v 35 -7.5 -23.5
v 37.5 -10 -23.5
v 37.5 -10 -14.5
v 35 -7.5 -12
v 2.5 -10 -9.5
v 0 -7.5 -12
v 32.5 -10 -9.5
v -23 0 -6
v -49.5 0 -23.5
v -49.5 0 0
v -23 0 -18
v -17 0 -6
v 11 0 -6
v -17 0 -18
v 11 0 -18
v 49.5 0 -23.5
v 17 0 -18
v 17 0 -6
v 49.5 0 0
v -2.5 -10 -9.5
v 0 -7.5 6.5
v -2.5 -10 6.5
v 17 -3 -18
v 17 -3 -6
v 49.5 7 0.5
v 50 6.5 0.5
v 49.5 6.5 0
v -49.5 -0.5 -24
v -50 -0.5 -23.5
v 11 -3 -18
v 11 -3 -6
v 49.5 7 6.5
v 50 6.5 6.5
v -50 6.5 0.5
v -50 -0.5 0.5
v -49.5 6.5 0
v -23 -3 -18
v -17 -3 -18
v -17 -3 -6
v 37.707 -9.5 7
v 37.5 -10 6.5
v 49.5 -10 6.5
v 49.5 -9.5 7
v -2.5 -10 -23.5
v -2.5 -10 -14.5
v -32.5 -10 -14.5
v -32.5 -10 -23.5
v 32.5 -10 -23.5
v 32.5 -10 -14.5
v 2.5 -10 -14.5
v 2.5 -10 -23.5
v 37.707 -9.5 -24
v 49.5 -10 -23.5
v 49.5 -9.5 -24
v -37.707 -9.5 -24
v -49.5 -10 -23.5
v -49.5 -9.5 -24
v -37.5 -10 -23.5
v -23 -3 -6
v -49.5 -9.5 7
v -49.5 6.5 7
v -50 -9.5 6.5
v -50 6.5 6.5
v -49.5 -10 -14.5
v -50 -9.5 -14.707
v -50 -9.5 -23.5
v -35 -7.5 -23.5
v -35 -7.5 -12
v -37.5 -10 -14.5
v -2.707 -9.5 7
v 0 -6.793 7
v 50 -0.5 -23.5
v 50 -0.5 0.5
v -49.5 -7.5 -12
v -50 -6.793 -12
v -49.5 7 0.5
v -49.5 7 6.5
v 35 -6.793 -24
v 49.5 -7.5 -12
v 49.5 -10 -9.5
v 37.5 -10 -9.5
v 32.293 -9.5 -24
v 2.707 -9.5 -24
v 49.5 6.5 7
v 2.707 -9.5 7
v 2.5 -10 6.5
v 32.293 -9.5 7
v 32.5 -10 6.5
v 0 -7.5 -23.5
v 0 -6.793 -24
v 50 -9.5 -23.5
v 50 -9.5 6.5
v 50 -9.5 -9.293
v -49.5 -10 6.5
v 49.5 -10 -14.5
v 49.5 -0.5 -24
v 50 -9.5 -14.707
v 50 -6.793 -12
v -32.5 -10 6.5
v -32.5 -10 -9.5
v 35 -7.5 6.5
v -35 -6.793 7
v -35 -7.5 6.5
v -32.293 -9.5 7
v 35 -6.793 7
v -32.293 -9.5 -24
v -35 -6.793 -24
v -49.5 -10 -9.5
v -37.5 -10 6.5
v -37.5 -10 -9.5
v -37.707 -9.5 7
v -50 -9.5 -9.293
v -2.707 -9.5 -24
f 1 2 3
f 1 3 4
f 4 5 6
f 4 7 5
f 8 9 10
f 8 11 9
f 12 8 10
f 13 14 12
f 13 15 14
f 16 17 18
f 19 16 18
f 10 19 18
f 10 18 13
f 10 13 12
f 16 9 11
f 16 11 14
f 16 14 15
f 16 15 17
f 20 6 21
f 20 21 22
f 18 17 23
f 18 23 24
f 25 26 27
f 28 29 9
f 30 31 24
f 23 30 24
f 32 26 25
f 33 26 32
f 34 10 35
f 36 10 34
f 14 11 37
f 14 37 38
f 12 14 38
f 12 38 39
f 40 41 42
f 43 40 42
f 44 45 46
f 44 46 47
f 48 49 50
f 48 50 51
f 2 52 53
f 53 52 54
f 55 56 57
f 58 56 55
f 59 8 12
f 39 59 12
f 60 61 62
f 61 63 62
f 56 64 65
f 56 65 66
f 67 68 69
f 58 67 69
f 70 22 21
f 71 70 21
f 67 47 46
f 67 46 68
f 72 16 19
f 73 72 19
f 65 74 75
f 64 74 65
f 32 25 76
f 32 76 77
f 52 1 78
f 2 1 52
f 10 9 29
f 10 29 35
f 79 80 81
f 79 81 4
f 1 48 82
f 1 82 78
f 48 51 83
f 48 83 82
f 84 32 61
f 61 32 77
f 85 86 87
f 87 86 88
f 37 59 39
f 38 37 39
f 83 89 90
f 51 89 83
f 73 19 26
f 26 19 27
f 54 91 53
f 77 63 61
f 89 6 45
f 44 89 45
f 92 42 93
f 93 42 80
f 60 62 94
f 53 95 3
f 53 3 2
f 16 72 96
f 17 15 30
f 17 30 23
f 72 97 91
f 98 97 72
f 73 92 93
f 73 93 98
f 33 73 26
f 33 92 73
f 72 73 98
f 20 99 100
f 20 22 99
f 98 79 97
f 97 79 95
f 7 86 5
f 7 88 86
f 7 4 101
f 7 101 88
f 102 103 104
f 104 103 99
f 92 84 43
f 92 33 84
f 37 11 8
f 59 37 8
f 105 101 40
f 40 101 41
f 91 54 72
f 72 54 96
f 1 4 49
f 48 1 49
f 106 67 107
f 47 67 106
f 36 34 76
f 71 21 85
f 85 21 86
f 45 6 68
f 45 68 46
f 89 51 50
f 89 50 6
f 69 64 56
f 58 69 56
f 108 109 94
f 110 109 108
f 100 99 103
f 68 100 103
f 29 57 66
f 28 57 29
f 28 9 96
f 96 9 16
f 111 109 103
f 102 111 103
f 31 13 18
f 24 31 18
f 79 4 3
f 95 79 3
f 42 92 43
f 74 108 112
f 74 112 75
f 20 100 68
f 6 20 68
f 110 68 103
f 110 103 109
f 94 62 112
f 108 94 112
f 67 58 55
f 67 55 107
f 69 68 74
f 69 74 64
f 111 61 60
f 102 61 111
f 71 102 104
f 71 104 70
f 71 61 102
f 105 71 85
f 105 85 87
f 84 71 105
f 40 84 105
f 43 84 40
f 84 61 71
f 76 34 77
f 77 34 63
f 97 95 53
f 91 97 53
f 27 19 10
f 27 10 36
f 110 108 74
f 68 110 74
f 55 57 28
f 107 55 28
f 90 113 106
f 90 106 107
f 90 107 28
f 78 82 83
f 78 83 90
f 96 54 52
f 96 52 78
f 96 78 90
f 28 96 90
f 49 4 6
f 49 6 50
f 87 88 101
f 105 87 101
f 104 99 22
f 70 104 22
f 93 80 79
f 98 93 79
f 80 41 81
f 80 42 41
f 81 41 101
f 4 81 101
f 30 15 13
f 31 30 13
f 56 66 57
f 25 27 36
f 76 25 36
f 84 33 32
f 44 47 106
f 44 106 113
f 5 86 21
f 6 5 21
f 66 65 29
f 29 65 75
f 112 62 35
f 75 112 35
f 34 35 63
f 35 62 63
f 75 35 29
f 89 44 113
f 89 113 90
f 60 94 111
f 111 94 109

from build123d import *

# Parameters (mm, degrees)
PAD_DEPTH         = 50
POCKET_DEPTH      = 24.001
POCKET_DEPTH_BACK = -7.001
SKETCH002_W       = 6
SKETCH002_H       = 12
POCKET001_DEPTH   = 3
CHAMFER_SIZE      = 0.5


with BuildPart() as part:
    # Sketch → Pad (new body, symmetric)
    with BuildSketch(Plane.YZ):
        Polygon((7, 7), (-10, 7), (-10, -9.5), (-7.5, -12), (-10, -14.5), (-10, -24), (0, -24), (0, 0), (7, 0), align=None)
    extrude(amount=PAD_DEPTH, both=True)

    # Sketch001 → Pocket (cut, two sides)
    with BuildSketch(Plane.XY) as pocket_sk:
        Polygon((-37.5, -10), (-32.5, -10), (-35, -7.5), align=None)
        Polygon((-2.5, -10), (2.5, -10), (0, -7.5), align=None)
        Polygon((32.5, -10), (37.5, -10), (35, -7.5), align=None)
    extrude(amount=-POCKET_DEPTH, mode=Mode.SUBTRACT)
    extrude(pocket_sk.sketch, amount=-POCKET_DEPTH_BACK, mode=Mode.SUBTRACT)

    # Sketch002 → Pocket001 (cut)
    with BuildSketch(Plane.XZ):
        with Locations((-20, -12)):
            Rectangle(SKETCH002_W, SKETCH002_H)
        with Locations((14, -12)):
            Rectangle(SKETCH002_W, SKETCH002_H)
    extrude(amount=POCKET001_DEPTH, mode=Mode.SUBTRACT)

    # Chamfer
    chamfer_edges = [part.edges().sort_by_distance(p)[0] for p in [
        (50, -1.5, 7),
        (50, -10, -1.25),
        (50, -8.75, -10.75),
        (50, -8.75, -13.25),
        (50, -10, -19.25),
        (50, -5, -24),
        (50, 0, -12),
        (50, 3.5, 0),
        (50, 7, 3.5),
        (-50, -1.5, 7),
        (-50, -10, -1.25),
        (-50, -8.75, -10.75),
        (-50, -8.75, -13.25),
        (-50, -10, -19.25),
        (-50, -5, -24),
        (-50, 0, -12),
        (-50, 3.5, 0),
        (-50, 7, 3.5),
        (0, 7, 0),
        (0, 7, 7),
        (-43.75, -10, 7),
        (-36.25, -8.75, 7),
        (-33.75, -8.75, 7),
        (-17.5, -10, 7),
        (-1.25, -8.75, 7),
        (1.25, -8.75, 7),
        (17.5, -10, 7),
        (33.75, -8.75, 7),
        (36.25, -8.75, 7),
        (43.75, -10, 7),
        (0, 0, -24),
        (43.75, -10, -24),
        (36.25, -8.75, -24),
        (33.75, -8.75, -24),
        (17.5, -10, -24),
        (1.25, -8.75, -24),
        (-1.25, -8.75, -24),
        (-17.5, -10, -24),
        (-33.75, -8.75, -24),
        (-36.25, -8.75, -24),
        (-43.75, -10, -24),
    ]]
    chamfer(chamfer_edges, length=CHAMFER_SIZE)


solid = part.part
